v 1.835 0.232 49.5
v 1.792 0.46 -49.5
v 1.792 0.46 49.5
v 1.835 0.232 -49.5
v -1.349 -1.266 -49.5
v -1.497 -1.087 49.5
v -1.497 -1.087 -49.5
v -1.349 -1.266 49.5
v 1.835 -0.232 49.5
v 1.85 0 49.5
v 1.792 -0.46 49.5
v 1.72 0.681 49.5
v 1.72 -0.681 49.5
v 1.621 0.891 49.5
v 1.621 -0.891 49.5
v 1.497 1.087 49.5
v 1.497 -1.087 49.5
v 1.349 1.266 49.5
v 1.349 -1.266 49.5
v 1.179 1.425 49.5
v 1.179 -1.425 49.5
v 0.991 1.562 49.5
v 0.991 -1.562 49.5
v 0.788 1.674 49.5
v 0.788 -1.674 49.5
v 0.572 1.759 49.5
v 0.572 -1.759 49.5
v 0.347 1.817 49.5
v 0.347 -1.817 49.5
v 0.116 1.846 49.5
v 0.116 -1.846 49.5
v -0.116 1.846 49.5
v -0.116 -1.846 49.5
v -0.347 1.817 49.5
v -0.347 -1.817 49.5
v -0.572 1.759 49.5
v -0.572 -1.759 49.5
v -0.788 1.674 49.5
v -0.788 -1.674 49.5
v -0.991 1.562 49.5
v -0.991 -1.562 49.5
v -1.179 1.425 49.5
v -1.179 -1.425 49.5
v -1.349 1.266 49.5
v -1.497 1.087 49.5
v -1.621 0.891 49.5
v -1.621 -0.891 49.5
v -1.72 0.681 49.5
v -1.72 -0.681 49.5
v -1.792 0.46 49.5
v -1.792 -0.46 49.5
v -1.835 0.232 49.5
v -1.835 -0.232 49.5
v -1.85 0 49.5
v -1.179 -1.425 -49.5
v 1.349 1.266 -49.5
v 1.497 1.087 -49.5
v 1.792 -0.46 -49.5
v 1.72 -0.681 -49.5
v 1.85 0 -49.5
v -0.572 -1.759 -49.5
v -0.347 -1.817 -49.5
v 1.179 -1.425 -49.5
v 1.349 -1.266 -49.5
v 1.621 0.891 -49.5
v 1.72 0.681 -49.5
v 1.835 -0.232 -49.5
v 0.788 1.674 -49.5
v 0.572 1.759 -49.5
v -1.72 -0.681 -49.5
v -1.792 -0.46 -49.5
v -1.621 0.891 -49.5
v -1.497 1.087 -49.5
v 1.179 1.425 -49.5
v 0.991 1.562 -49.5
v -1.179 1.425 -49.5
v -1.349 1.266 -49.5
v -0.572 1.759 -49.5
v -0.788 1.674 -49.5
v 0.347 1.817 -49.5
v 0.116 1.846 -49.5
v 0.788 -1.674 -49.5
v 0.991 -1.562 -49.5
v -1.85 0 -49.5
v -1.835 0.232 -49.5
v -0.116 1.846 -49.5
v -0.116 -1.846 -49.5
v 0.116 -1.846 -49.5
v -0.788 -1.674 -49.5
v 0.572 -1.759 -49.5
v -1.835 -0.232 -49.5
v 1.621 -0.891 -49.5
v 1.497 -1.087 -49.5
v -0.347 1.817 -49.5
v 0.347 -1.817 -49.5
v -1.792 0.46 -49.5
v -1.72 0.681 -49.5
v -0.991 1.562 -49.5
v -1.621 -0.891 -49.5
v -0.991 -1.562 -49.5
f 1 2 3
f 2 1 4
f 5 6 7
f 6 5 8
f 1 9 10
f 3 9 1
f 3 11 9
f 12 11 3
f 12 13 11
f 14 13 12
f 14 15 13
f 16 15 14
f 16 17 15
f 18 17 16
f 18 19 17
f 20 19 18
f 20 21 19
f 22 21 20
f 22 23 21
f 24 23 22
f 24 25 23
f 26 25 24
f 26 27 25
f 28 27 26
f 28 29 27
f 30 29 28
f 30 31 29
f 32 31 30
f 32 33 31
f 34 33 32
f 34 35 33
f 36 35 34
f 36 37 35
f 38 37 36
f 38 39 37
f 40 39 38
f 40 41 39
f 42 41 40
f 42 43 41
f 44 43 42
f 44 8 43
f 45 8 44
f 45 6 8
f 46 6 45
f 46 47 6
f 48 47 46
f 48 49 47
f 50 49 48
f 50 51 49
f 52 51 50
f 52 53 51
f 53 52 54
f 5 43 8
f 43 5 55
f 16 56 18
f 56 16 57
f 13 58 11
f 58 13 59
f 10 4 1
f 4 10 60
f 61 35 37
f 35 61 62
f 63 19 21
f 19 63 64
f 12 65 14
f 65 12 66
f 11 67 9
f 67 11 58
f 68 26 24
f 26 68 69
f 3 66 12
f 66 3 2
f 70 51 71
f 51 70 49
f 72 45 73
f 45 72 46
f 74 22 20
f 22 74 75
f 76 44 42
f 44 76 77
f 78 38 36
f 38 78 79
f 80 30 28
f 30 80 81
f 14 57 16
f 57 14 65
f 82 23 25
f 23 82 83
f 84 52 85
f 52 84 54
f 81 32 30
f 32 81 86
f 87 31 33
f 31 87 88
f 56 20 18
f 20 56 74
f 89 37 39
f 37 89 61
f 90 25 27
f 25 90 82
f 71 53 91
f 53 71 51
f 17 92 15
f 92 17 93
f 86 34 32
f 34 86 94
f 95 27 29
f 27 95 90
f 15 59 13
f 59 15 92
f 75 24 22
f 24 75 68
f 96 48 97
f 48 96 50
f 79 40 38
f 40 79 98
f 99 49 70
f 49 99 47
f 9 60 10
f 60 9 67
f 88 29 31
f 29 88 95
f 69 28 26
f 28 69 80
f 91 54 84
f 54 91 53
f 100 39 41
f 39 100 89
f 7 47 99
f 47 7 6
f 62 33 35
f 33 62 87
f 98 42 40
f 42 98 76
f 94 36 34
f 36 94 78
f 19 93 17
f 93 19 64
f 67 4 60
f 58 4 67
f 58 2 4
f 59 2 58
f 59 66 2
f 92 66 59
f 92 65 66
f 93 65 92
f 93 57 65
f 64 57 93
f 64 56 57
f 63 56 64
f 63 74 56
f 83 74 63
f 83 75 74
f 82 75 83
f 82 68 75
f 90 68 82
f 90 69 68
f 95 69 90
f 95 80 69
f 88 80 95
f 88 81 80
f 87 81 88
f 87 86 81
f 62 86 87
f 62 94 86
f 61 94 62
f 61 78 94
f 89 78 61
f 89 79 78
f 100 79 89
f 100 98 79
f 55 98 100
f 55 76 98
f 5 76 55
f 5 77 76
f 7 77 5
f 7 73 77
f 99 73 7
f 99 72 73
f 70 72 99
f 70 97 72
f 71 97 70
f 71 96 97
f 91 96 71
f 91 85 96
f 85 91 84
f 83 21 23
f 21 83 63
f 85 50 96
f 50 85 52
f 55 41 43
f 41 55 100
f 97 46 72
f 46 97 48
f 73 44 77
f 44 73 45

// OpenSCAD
$fn = 50;


difference() {
	union() {
		translate(v = [0, 0, -49.5000000000]) {
			cylinder(h = 99, r = 1.8500000000);
		}
	}
	union() {
		translate(v = [0, 0, -100.0000000000]) {
			cylinder(h = 200, r = 0);
		}
	}
}
